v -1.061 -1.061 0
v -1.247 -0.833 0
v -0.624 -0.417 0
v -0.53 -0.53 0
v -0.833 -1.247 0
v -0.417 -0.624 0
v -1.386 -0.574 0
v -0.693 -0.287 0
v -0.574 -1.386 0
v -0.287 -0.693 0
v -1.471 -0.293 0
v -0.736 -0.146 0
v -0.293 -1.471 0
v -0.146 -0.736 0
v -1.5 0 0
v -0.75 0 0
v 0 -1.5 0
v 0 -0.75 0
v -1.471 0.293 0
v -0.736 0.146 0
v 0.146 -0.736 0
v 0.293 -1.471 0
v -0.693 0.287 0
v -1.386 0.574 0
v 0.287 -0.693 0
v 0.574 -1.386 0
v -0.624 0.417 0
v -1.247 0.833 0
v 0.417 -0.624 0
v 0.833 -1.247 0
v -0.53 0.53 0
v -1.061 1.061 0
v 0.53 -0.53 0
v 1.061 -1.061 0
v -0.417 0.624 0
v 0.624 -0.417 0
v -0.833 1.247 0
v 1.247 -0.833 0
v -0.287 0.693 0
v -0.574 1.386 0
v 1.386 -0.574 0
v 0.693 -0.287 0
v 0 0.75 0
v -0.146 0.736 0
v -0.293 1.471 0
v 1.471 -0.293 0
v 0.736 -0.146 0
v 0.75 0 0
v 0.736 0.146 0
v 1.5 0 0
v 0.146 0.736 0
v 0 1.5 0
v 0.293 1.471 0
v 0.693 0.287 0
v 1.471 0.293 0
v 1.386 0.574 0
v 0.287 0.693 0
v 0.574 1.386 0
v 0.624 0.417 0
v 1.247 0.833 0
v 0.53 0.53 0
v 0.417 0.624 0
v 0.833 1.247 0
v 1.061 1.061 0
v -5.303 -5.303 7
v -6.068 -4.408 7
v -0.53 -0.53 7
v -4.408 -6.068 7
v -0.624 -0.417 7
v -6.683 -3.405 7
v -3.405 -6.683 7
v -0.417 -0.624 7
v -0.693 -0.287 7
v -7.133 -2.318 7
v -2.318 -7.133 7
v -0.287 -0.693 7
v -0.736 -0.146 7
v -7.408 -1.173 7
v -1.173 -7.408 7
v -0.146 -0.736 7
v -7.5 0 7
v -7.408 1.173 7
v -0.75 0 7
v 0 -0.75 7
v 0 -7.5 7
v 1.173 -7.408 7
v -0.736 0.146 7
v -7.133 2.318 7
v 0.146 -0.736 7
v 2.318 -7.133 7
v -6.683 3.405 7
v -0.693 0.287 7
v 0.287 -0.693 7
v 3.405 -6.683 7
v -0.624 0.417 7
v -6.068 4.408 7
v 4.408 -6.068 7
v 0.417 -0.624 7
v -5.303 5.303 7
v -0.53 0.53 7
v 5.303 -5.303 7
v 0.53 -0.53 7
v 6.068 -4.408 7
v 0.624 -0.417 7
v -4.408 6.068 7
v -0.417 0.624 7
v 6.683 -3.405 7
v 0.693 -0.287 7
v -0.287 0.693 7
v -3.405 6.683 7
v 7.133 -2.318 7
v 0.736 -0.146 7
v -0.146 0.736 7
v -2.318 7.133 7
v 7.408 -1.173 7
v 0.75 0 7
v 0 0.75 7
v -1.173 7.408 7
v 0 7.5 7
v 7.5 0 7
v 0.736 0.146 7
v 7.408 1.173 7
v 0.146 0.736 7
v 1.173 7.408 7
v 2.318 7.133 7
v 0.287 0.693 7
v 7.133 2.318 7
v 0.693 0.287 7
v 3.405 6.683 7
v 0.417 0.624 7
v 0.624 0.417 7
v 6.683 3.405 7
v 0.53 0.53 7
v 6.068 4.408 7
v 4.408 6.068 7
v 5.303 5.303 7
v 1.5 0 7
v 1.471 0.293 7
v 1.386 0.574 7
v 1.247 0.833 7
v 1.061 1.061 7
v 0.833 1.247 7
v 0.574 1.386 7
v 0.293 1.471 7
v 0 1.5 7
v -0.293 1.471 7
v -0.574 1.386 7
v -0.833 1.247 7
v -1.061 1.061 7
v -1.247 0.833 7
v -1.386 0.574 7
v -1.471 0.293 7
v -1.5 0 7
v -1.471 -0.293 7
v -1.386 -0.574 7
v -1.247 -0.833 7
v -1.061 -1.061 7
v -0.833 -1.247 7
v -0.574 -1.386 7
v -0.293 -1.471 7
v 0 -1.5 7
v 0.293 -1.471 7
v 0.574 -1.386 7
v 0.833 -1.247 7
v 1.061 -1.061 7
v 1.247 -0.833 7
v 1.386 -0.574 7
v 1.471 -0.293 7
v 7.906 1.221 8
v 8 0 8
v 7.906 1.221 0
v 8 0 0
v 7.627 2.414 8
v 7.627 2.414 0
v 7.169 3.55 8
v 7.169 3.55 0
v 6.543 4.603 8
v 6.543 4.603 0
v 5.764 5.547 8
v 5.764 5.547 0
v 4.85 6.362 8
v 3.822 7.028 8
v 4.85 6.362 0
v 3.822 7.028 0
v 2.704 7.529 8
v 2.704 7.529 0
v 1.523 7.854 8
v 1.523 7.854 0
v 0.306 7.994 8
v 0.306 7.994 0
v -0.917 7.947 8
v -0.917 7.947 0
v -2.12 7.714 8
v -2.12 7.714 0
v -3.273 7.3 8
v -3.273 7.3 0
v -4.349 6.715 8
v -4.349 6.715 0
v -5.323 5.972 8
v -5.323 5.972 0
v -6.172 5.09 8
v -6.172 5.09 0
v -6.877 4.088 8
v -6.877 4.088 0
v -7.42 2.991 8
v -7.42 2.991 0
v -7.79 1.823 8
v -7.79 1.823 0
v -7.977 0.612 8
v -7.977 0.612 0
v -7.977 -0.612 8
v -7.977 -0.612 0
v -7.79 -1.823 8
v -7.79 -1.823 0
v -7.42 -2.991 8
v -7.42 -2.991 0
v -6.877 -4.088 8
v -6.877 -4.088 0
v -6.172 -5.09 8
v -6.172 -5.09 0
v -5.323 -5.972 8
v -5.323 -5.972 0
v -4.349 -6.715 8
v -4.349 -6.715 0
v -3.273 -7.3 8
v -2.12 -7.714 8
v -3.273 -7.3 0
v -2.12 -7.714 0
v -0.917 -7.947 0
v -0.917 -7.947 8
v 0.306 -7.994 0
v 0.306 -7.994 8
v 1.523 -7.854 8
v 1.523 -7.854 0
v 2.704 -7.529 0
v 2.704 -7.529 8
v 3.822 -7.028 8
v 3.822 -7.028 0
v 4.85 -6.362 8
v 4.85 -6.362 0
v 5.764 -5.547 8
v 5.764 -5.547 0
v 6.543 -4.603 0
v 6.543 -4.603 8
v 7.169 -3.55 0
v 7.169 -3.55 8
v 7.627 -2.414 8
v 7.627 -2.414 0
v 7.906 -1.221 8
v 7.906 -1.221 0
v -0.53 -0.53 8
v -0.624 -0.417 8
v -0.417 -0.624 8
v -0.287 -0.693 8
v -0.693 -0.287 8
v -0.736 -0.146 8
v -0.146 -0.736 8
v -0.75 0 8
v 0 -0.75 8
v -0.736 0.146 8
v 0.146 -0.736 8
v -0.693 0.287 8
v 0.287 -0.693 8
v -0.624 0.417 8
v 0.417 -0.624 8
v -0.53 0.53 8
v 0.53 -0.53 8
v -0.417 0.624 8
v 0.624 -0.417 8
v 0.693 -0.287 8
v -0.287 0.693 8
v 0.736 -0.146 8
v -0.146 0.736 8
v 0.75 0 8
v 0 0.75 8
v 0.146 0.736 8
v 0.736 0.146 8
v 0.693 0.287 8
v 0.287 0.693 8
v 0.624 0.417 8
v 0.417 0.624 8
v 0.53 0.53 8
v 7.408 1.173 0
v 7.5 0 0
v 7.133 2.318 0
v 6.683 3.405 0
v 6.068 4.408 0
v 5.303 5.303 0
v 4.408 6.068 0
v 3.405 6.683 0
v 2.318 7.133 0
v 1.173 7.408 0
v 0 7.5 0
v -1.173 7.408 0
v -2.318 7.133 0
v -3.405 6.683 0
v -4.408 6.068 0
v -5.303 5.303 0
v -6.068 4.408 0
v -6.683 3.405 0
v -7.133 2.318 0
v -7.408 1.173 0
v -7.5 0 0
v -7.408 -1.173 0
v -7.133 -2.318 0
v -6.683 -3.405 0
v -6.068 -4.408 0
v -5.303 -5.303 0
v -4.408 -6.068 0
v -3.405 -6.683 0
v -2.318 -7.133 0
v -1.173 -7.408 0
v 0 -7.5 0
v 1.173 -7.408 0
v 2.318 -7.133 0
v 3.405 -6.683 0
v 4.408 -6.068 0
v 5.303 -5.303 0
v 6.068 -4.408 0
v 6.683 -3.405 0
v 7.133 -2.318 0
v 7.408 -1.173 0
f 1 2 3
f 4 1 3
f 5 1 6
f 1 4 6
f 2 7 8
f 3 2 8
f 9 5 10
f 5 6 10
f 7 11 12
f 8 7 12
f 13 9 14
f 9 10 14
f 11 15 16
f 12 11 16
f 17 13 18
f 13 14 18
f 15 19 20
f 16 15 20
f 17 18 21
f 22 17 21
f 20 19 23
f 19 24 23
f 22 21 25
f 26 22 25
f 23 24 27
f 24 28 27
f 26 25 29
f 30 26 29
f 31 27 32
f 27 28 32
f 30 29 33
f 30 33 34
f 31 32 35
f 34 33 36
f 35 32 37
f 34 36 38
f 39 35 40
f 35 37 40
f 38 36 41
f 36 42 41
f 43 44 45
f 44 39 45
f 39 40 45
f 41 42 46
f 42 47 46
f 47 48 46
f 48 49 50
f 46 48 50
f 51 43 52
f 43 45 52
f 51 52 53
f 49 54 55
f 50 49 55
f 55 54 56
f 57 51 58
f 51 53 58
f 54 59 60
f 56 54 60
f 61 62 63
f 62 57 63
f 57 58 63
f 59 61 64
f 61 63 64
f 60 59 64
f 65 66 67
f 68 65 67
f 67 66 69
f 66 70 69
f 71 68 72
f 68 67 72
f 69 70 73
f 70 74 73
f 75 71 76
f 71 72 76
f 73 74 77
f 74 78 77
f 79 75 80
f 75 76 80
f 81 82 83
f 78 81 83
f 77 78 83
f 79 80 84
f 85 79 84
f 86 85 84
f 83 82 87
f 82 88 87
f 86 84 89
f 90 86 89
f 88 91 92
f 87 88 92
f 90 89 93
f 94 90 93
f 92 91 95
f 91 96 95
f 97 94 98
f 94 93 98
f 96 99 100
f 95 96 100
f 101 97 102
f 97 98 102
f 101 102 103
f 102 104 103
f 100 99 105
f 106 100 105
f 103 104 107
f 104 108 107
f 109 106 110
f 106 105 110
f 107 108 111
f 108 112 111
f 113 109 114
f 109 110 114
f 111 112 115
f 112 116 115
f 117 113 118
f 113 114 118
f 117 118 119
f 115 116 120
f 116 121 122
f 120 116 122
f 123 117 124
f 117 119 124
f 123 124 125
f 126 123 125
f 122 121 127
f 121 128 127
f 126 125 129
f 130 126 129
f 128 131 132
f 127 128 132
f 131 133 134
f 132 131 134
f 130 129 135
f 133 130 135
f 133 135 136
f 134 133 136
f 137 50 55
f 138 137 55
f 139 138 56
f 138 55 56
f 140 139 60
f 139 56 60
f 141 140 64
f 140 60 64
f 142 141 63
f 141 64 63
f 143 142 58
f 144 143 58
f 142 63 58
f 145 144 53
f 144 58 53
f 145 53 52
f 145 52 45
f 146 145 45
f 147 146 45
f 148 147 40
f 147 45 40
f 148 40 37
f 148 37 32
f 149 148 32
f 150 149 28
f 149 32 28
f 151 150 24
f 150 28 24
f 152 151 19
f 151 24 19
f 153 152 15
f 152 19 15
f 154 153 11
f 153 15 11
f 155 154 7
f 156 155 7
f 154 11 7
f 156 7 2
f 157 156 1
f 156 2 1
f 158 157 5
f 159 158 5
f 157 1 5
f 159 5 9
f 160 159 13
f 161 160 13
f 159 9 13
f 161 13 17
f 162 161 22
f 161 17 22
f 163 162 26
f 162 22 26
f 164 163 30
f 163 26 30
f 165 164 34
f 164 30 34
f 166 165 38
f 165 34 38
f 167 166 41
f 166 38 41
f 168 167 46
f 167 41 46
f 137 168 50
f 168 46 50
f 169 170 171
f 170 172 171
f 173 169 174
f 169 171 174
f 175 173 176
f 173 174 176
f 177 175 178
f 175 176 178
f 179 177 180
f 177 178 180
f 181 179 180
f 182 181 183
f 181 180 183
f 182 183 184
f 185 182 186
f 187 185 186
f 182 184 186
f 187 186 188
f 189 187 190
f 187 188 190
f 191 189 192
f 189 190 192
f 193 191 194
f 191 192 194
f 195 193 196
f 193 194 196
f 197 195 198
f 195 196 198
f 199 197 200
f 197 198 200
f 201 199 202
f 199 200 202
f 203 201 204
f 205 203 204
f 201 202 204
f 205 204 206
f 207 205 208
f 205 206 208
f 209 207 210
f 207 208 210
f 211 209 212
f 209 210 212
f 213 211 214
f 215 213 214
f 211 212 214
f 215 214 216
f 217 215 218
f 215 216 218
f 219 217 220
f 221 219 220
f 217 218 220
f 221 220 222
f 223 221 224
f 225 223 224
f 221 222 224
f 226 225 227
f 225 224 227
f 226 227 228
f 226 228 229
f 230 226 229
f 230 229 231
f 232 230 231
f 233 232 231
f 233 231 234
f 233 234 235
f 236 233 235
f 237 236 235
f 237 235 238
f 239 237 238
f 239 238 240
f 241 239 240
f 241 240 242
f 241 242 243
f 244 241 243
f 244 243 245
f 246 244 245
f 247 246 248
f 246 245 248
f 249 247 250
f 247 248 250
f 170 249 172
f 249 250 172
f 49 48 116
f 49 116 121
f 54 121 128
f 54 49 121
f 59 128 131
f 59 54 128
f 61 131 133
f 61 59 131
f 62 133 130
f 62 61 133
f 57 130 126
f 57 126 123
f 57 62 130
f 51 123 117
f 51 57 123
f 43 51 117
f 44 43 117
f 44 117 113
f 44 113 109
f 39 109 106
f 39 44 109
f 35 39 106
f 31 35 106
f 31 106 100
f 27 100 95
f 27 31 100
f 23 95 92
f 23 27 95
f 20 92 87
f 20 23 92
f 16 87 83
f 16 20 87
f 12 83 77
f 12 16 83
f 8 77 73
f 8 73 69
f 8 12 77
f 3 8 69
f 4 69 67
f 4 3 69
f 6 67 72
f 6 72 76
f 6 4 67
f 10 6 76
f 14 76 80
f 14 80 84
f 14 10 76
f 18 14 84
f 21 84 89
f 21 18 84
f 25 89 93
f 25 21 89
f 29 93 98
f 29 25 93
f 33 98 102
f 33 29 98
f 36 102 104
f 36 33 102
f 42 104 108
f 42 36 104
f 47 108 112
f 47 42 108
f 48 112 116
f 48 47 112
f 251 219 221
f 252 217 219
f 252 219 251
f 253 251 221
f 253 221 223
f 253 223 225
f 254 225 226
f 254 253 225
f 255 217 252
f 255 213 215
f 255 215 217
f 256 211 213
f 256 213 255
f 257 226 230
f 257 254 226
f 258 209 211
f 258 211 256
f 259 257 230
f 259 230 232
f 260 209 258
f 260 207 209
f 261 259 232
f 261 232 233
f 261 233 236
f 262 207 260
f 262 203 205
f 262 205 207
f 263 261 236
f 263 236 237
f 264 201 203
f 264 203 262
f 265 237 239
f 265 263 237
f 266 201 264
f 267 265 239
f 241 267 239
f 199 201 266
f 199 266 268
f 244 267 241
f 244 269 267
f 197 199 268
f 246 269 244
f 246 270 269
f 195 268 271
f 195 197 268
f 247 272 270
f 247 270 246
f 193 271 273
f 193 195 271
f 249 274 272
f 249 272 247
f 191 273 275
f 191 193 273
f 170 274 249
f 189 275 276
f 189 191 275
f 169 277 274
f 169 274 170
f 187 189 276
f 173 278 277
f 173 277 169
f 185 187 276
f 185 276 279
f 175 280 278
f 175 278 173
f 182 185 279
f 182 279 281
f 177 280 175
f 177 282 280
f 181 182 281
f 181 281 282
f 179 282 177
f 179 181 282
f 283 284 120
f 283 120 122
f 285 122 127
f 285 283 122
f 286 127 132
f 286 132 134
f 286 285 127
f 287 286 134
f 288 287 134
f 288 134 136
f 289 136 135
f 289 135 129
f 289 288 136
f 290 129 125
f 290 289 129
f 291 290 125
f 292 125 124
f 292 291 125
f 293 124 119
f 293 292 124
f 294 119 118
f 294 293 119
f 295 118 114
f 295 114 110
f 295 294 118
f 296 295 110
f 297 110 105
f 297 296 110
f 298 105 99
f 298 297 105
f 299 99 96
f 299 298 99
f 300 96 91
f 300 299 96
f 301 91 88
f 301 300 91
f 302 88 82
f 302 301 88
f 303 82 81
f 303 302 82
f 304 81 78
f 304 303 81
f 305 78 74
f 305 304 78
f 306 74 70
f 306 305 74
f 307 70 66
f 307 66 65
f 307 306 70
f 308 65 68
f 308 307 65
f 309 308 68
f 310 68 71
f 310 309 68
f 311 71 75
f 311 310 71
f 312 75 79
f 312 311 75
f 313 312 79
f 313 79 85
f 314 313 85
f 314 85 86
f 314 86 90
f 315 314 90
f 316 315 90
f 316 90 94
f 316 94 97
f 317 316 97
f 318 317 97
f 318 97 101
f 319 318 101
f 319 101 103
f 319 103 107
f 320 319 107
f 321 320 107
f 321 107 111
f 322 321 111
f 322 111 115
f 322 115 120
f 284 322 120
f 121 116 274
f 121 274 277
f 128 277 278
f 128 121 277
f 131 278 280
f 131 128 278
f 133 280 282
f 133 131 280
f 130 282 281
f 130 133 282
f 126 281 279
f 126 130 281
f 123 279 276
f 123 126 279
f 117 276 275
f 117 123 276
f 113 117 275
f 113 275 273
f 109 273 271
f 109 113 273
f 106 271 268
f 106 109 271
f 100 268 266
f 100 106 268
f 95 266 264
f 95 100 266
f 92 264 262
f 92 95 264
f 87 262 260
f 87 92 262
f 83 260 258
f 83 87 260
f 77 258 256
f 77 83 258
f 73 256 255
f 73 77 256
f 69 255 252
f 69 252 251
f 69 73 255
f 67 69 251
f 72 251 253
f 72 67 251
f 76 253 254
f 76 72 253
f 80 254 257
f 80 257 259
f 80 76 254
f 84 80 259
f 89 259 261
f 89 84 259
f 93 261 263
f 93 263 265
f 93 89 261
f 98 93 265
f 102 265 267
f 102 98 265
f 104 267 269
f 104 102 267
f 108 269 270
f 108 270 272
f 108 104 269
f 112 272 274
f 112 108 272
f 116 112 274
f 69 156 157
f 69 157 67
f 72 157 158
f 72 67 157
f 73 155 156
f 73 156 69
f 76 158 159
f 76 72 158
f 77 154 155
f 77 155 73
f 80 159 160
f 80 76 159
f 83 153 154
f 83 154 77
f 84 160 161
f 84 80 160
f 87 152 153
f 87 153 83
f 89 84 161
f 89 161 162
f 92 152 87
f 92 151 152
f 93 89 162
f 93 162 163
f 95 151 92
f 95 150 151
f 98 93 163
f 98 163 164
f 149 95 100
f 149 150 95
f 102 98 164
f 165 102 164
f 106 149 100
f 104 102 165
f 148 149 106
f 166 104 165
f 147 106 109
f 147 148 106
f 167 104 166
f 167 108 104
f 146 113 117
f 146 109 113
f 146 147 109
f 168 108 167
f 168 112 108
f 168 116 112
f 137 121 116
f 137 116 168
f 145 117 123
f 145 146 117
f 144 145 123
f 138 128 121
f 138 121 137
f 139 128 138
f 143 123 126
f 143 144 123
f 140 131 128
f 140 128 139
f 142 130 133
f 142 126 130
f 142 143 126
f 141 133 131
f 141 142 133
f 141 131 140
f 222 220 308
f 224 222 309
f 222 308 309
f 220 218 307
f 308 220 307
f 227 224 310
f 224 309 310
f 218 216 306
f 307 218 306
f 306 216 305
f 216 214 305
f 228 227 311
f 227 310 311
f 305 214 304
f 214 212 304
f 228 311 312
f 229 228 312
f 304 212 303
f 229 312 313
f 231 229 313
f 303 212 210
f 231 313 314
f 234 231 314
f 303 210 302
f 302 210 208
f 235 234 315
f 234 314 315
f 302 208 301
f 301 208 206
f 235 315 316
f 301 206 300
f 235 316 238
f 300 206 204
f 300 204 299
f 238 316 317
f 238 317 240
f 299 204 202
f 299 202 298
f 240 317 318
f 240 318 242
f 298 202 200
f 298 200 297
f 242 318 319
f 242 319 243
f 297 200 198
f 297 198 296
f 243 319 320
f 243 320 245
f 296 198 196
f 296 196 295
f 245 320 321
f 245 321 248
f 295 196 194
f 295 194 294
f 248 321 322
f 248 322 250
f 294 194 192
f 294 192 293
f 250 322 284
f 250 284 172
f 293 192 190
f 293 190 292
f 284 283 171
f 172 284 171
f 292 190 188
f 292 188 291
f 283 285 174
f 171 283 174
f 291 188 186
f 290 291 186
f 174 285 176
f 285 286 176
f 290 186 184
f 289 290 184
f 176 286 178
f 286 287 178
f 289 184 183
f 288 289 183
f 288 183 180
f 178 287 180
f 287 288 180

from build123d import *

# Parameters (mm, degrees)
F0_R     = 1.5
F0_R_2   = 0.75
F1_DEPTH = 7
F0_R_3   = 8
F0_R_4   = 7.5
F2_R     = 8
F2_R_2   = 1.5
F2_R_3   = 0.75
F3_DEPTH = 1


with BuildPart() as f1:
    # F0 (on Top) → F1 (new body)
    with BuildSketch(Plane.XY):
        Circle(F0_R)
        Circle(F0_R_2, mode=Mode.SUBTRACT)
    extrude(amount=F1_DEPTH)


with BuildPart() as f1b:
    # F0 (on Top) → F1, piece 2 (new body)
    with BuildSketch(Plane.XY):
        Circle(F0_R_3)
        Circle(F0_R_4, mode=Mode.SUBTRACT)
    extrude(amount=F1_DEPTH)

    # F2 (on face) → F3 (join)
    with BuildSketch(Plane.XY.offset(7)):
        Circle(F2_R)
        Circle(F2_R_2, mode=Mode.SUBTRACT)
        Circle(F2_R_2)
        Circle(F2_R_3, mode=Mode.SUBTRACT)
    extrude(amount=F3_DEPTH)


solid = Compound([f1.part, f1b.part])
